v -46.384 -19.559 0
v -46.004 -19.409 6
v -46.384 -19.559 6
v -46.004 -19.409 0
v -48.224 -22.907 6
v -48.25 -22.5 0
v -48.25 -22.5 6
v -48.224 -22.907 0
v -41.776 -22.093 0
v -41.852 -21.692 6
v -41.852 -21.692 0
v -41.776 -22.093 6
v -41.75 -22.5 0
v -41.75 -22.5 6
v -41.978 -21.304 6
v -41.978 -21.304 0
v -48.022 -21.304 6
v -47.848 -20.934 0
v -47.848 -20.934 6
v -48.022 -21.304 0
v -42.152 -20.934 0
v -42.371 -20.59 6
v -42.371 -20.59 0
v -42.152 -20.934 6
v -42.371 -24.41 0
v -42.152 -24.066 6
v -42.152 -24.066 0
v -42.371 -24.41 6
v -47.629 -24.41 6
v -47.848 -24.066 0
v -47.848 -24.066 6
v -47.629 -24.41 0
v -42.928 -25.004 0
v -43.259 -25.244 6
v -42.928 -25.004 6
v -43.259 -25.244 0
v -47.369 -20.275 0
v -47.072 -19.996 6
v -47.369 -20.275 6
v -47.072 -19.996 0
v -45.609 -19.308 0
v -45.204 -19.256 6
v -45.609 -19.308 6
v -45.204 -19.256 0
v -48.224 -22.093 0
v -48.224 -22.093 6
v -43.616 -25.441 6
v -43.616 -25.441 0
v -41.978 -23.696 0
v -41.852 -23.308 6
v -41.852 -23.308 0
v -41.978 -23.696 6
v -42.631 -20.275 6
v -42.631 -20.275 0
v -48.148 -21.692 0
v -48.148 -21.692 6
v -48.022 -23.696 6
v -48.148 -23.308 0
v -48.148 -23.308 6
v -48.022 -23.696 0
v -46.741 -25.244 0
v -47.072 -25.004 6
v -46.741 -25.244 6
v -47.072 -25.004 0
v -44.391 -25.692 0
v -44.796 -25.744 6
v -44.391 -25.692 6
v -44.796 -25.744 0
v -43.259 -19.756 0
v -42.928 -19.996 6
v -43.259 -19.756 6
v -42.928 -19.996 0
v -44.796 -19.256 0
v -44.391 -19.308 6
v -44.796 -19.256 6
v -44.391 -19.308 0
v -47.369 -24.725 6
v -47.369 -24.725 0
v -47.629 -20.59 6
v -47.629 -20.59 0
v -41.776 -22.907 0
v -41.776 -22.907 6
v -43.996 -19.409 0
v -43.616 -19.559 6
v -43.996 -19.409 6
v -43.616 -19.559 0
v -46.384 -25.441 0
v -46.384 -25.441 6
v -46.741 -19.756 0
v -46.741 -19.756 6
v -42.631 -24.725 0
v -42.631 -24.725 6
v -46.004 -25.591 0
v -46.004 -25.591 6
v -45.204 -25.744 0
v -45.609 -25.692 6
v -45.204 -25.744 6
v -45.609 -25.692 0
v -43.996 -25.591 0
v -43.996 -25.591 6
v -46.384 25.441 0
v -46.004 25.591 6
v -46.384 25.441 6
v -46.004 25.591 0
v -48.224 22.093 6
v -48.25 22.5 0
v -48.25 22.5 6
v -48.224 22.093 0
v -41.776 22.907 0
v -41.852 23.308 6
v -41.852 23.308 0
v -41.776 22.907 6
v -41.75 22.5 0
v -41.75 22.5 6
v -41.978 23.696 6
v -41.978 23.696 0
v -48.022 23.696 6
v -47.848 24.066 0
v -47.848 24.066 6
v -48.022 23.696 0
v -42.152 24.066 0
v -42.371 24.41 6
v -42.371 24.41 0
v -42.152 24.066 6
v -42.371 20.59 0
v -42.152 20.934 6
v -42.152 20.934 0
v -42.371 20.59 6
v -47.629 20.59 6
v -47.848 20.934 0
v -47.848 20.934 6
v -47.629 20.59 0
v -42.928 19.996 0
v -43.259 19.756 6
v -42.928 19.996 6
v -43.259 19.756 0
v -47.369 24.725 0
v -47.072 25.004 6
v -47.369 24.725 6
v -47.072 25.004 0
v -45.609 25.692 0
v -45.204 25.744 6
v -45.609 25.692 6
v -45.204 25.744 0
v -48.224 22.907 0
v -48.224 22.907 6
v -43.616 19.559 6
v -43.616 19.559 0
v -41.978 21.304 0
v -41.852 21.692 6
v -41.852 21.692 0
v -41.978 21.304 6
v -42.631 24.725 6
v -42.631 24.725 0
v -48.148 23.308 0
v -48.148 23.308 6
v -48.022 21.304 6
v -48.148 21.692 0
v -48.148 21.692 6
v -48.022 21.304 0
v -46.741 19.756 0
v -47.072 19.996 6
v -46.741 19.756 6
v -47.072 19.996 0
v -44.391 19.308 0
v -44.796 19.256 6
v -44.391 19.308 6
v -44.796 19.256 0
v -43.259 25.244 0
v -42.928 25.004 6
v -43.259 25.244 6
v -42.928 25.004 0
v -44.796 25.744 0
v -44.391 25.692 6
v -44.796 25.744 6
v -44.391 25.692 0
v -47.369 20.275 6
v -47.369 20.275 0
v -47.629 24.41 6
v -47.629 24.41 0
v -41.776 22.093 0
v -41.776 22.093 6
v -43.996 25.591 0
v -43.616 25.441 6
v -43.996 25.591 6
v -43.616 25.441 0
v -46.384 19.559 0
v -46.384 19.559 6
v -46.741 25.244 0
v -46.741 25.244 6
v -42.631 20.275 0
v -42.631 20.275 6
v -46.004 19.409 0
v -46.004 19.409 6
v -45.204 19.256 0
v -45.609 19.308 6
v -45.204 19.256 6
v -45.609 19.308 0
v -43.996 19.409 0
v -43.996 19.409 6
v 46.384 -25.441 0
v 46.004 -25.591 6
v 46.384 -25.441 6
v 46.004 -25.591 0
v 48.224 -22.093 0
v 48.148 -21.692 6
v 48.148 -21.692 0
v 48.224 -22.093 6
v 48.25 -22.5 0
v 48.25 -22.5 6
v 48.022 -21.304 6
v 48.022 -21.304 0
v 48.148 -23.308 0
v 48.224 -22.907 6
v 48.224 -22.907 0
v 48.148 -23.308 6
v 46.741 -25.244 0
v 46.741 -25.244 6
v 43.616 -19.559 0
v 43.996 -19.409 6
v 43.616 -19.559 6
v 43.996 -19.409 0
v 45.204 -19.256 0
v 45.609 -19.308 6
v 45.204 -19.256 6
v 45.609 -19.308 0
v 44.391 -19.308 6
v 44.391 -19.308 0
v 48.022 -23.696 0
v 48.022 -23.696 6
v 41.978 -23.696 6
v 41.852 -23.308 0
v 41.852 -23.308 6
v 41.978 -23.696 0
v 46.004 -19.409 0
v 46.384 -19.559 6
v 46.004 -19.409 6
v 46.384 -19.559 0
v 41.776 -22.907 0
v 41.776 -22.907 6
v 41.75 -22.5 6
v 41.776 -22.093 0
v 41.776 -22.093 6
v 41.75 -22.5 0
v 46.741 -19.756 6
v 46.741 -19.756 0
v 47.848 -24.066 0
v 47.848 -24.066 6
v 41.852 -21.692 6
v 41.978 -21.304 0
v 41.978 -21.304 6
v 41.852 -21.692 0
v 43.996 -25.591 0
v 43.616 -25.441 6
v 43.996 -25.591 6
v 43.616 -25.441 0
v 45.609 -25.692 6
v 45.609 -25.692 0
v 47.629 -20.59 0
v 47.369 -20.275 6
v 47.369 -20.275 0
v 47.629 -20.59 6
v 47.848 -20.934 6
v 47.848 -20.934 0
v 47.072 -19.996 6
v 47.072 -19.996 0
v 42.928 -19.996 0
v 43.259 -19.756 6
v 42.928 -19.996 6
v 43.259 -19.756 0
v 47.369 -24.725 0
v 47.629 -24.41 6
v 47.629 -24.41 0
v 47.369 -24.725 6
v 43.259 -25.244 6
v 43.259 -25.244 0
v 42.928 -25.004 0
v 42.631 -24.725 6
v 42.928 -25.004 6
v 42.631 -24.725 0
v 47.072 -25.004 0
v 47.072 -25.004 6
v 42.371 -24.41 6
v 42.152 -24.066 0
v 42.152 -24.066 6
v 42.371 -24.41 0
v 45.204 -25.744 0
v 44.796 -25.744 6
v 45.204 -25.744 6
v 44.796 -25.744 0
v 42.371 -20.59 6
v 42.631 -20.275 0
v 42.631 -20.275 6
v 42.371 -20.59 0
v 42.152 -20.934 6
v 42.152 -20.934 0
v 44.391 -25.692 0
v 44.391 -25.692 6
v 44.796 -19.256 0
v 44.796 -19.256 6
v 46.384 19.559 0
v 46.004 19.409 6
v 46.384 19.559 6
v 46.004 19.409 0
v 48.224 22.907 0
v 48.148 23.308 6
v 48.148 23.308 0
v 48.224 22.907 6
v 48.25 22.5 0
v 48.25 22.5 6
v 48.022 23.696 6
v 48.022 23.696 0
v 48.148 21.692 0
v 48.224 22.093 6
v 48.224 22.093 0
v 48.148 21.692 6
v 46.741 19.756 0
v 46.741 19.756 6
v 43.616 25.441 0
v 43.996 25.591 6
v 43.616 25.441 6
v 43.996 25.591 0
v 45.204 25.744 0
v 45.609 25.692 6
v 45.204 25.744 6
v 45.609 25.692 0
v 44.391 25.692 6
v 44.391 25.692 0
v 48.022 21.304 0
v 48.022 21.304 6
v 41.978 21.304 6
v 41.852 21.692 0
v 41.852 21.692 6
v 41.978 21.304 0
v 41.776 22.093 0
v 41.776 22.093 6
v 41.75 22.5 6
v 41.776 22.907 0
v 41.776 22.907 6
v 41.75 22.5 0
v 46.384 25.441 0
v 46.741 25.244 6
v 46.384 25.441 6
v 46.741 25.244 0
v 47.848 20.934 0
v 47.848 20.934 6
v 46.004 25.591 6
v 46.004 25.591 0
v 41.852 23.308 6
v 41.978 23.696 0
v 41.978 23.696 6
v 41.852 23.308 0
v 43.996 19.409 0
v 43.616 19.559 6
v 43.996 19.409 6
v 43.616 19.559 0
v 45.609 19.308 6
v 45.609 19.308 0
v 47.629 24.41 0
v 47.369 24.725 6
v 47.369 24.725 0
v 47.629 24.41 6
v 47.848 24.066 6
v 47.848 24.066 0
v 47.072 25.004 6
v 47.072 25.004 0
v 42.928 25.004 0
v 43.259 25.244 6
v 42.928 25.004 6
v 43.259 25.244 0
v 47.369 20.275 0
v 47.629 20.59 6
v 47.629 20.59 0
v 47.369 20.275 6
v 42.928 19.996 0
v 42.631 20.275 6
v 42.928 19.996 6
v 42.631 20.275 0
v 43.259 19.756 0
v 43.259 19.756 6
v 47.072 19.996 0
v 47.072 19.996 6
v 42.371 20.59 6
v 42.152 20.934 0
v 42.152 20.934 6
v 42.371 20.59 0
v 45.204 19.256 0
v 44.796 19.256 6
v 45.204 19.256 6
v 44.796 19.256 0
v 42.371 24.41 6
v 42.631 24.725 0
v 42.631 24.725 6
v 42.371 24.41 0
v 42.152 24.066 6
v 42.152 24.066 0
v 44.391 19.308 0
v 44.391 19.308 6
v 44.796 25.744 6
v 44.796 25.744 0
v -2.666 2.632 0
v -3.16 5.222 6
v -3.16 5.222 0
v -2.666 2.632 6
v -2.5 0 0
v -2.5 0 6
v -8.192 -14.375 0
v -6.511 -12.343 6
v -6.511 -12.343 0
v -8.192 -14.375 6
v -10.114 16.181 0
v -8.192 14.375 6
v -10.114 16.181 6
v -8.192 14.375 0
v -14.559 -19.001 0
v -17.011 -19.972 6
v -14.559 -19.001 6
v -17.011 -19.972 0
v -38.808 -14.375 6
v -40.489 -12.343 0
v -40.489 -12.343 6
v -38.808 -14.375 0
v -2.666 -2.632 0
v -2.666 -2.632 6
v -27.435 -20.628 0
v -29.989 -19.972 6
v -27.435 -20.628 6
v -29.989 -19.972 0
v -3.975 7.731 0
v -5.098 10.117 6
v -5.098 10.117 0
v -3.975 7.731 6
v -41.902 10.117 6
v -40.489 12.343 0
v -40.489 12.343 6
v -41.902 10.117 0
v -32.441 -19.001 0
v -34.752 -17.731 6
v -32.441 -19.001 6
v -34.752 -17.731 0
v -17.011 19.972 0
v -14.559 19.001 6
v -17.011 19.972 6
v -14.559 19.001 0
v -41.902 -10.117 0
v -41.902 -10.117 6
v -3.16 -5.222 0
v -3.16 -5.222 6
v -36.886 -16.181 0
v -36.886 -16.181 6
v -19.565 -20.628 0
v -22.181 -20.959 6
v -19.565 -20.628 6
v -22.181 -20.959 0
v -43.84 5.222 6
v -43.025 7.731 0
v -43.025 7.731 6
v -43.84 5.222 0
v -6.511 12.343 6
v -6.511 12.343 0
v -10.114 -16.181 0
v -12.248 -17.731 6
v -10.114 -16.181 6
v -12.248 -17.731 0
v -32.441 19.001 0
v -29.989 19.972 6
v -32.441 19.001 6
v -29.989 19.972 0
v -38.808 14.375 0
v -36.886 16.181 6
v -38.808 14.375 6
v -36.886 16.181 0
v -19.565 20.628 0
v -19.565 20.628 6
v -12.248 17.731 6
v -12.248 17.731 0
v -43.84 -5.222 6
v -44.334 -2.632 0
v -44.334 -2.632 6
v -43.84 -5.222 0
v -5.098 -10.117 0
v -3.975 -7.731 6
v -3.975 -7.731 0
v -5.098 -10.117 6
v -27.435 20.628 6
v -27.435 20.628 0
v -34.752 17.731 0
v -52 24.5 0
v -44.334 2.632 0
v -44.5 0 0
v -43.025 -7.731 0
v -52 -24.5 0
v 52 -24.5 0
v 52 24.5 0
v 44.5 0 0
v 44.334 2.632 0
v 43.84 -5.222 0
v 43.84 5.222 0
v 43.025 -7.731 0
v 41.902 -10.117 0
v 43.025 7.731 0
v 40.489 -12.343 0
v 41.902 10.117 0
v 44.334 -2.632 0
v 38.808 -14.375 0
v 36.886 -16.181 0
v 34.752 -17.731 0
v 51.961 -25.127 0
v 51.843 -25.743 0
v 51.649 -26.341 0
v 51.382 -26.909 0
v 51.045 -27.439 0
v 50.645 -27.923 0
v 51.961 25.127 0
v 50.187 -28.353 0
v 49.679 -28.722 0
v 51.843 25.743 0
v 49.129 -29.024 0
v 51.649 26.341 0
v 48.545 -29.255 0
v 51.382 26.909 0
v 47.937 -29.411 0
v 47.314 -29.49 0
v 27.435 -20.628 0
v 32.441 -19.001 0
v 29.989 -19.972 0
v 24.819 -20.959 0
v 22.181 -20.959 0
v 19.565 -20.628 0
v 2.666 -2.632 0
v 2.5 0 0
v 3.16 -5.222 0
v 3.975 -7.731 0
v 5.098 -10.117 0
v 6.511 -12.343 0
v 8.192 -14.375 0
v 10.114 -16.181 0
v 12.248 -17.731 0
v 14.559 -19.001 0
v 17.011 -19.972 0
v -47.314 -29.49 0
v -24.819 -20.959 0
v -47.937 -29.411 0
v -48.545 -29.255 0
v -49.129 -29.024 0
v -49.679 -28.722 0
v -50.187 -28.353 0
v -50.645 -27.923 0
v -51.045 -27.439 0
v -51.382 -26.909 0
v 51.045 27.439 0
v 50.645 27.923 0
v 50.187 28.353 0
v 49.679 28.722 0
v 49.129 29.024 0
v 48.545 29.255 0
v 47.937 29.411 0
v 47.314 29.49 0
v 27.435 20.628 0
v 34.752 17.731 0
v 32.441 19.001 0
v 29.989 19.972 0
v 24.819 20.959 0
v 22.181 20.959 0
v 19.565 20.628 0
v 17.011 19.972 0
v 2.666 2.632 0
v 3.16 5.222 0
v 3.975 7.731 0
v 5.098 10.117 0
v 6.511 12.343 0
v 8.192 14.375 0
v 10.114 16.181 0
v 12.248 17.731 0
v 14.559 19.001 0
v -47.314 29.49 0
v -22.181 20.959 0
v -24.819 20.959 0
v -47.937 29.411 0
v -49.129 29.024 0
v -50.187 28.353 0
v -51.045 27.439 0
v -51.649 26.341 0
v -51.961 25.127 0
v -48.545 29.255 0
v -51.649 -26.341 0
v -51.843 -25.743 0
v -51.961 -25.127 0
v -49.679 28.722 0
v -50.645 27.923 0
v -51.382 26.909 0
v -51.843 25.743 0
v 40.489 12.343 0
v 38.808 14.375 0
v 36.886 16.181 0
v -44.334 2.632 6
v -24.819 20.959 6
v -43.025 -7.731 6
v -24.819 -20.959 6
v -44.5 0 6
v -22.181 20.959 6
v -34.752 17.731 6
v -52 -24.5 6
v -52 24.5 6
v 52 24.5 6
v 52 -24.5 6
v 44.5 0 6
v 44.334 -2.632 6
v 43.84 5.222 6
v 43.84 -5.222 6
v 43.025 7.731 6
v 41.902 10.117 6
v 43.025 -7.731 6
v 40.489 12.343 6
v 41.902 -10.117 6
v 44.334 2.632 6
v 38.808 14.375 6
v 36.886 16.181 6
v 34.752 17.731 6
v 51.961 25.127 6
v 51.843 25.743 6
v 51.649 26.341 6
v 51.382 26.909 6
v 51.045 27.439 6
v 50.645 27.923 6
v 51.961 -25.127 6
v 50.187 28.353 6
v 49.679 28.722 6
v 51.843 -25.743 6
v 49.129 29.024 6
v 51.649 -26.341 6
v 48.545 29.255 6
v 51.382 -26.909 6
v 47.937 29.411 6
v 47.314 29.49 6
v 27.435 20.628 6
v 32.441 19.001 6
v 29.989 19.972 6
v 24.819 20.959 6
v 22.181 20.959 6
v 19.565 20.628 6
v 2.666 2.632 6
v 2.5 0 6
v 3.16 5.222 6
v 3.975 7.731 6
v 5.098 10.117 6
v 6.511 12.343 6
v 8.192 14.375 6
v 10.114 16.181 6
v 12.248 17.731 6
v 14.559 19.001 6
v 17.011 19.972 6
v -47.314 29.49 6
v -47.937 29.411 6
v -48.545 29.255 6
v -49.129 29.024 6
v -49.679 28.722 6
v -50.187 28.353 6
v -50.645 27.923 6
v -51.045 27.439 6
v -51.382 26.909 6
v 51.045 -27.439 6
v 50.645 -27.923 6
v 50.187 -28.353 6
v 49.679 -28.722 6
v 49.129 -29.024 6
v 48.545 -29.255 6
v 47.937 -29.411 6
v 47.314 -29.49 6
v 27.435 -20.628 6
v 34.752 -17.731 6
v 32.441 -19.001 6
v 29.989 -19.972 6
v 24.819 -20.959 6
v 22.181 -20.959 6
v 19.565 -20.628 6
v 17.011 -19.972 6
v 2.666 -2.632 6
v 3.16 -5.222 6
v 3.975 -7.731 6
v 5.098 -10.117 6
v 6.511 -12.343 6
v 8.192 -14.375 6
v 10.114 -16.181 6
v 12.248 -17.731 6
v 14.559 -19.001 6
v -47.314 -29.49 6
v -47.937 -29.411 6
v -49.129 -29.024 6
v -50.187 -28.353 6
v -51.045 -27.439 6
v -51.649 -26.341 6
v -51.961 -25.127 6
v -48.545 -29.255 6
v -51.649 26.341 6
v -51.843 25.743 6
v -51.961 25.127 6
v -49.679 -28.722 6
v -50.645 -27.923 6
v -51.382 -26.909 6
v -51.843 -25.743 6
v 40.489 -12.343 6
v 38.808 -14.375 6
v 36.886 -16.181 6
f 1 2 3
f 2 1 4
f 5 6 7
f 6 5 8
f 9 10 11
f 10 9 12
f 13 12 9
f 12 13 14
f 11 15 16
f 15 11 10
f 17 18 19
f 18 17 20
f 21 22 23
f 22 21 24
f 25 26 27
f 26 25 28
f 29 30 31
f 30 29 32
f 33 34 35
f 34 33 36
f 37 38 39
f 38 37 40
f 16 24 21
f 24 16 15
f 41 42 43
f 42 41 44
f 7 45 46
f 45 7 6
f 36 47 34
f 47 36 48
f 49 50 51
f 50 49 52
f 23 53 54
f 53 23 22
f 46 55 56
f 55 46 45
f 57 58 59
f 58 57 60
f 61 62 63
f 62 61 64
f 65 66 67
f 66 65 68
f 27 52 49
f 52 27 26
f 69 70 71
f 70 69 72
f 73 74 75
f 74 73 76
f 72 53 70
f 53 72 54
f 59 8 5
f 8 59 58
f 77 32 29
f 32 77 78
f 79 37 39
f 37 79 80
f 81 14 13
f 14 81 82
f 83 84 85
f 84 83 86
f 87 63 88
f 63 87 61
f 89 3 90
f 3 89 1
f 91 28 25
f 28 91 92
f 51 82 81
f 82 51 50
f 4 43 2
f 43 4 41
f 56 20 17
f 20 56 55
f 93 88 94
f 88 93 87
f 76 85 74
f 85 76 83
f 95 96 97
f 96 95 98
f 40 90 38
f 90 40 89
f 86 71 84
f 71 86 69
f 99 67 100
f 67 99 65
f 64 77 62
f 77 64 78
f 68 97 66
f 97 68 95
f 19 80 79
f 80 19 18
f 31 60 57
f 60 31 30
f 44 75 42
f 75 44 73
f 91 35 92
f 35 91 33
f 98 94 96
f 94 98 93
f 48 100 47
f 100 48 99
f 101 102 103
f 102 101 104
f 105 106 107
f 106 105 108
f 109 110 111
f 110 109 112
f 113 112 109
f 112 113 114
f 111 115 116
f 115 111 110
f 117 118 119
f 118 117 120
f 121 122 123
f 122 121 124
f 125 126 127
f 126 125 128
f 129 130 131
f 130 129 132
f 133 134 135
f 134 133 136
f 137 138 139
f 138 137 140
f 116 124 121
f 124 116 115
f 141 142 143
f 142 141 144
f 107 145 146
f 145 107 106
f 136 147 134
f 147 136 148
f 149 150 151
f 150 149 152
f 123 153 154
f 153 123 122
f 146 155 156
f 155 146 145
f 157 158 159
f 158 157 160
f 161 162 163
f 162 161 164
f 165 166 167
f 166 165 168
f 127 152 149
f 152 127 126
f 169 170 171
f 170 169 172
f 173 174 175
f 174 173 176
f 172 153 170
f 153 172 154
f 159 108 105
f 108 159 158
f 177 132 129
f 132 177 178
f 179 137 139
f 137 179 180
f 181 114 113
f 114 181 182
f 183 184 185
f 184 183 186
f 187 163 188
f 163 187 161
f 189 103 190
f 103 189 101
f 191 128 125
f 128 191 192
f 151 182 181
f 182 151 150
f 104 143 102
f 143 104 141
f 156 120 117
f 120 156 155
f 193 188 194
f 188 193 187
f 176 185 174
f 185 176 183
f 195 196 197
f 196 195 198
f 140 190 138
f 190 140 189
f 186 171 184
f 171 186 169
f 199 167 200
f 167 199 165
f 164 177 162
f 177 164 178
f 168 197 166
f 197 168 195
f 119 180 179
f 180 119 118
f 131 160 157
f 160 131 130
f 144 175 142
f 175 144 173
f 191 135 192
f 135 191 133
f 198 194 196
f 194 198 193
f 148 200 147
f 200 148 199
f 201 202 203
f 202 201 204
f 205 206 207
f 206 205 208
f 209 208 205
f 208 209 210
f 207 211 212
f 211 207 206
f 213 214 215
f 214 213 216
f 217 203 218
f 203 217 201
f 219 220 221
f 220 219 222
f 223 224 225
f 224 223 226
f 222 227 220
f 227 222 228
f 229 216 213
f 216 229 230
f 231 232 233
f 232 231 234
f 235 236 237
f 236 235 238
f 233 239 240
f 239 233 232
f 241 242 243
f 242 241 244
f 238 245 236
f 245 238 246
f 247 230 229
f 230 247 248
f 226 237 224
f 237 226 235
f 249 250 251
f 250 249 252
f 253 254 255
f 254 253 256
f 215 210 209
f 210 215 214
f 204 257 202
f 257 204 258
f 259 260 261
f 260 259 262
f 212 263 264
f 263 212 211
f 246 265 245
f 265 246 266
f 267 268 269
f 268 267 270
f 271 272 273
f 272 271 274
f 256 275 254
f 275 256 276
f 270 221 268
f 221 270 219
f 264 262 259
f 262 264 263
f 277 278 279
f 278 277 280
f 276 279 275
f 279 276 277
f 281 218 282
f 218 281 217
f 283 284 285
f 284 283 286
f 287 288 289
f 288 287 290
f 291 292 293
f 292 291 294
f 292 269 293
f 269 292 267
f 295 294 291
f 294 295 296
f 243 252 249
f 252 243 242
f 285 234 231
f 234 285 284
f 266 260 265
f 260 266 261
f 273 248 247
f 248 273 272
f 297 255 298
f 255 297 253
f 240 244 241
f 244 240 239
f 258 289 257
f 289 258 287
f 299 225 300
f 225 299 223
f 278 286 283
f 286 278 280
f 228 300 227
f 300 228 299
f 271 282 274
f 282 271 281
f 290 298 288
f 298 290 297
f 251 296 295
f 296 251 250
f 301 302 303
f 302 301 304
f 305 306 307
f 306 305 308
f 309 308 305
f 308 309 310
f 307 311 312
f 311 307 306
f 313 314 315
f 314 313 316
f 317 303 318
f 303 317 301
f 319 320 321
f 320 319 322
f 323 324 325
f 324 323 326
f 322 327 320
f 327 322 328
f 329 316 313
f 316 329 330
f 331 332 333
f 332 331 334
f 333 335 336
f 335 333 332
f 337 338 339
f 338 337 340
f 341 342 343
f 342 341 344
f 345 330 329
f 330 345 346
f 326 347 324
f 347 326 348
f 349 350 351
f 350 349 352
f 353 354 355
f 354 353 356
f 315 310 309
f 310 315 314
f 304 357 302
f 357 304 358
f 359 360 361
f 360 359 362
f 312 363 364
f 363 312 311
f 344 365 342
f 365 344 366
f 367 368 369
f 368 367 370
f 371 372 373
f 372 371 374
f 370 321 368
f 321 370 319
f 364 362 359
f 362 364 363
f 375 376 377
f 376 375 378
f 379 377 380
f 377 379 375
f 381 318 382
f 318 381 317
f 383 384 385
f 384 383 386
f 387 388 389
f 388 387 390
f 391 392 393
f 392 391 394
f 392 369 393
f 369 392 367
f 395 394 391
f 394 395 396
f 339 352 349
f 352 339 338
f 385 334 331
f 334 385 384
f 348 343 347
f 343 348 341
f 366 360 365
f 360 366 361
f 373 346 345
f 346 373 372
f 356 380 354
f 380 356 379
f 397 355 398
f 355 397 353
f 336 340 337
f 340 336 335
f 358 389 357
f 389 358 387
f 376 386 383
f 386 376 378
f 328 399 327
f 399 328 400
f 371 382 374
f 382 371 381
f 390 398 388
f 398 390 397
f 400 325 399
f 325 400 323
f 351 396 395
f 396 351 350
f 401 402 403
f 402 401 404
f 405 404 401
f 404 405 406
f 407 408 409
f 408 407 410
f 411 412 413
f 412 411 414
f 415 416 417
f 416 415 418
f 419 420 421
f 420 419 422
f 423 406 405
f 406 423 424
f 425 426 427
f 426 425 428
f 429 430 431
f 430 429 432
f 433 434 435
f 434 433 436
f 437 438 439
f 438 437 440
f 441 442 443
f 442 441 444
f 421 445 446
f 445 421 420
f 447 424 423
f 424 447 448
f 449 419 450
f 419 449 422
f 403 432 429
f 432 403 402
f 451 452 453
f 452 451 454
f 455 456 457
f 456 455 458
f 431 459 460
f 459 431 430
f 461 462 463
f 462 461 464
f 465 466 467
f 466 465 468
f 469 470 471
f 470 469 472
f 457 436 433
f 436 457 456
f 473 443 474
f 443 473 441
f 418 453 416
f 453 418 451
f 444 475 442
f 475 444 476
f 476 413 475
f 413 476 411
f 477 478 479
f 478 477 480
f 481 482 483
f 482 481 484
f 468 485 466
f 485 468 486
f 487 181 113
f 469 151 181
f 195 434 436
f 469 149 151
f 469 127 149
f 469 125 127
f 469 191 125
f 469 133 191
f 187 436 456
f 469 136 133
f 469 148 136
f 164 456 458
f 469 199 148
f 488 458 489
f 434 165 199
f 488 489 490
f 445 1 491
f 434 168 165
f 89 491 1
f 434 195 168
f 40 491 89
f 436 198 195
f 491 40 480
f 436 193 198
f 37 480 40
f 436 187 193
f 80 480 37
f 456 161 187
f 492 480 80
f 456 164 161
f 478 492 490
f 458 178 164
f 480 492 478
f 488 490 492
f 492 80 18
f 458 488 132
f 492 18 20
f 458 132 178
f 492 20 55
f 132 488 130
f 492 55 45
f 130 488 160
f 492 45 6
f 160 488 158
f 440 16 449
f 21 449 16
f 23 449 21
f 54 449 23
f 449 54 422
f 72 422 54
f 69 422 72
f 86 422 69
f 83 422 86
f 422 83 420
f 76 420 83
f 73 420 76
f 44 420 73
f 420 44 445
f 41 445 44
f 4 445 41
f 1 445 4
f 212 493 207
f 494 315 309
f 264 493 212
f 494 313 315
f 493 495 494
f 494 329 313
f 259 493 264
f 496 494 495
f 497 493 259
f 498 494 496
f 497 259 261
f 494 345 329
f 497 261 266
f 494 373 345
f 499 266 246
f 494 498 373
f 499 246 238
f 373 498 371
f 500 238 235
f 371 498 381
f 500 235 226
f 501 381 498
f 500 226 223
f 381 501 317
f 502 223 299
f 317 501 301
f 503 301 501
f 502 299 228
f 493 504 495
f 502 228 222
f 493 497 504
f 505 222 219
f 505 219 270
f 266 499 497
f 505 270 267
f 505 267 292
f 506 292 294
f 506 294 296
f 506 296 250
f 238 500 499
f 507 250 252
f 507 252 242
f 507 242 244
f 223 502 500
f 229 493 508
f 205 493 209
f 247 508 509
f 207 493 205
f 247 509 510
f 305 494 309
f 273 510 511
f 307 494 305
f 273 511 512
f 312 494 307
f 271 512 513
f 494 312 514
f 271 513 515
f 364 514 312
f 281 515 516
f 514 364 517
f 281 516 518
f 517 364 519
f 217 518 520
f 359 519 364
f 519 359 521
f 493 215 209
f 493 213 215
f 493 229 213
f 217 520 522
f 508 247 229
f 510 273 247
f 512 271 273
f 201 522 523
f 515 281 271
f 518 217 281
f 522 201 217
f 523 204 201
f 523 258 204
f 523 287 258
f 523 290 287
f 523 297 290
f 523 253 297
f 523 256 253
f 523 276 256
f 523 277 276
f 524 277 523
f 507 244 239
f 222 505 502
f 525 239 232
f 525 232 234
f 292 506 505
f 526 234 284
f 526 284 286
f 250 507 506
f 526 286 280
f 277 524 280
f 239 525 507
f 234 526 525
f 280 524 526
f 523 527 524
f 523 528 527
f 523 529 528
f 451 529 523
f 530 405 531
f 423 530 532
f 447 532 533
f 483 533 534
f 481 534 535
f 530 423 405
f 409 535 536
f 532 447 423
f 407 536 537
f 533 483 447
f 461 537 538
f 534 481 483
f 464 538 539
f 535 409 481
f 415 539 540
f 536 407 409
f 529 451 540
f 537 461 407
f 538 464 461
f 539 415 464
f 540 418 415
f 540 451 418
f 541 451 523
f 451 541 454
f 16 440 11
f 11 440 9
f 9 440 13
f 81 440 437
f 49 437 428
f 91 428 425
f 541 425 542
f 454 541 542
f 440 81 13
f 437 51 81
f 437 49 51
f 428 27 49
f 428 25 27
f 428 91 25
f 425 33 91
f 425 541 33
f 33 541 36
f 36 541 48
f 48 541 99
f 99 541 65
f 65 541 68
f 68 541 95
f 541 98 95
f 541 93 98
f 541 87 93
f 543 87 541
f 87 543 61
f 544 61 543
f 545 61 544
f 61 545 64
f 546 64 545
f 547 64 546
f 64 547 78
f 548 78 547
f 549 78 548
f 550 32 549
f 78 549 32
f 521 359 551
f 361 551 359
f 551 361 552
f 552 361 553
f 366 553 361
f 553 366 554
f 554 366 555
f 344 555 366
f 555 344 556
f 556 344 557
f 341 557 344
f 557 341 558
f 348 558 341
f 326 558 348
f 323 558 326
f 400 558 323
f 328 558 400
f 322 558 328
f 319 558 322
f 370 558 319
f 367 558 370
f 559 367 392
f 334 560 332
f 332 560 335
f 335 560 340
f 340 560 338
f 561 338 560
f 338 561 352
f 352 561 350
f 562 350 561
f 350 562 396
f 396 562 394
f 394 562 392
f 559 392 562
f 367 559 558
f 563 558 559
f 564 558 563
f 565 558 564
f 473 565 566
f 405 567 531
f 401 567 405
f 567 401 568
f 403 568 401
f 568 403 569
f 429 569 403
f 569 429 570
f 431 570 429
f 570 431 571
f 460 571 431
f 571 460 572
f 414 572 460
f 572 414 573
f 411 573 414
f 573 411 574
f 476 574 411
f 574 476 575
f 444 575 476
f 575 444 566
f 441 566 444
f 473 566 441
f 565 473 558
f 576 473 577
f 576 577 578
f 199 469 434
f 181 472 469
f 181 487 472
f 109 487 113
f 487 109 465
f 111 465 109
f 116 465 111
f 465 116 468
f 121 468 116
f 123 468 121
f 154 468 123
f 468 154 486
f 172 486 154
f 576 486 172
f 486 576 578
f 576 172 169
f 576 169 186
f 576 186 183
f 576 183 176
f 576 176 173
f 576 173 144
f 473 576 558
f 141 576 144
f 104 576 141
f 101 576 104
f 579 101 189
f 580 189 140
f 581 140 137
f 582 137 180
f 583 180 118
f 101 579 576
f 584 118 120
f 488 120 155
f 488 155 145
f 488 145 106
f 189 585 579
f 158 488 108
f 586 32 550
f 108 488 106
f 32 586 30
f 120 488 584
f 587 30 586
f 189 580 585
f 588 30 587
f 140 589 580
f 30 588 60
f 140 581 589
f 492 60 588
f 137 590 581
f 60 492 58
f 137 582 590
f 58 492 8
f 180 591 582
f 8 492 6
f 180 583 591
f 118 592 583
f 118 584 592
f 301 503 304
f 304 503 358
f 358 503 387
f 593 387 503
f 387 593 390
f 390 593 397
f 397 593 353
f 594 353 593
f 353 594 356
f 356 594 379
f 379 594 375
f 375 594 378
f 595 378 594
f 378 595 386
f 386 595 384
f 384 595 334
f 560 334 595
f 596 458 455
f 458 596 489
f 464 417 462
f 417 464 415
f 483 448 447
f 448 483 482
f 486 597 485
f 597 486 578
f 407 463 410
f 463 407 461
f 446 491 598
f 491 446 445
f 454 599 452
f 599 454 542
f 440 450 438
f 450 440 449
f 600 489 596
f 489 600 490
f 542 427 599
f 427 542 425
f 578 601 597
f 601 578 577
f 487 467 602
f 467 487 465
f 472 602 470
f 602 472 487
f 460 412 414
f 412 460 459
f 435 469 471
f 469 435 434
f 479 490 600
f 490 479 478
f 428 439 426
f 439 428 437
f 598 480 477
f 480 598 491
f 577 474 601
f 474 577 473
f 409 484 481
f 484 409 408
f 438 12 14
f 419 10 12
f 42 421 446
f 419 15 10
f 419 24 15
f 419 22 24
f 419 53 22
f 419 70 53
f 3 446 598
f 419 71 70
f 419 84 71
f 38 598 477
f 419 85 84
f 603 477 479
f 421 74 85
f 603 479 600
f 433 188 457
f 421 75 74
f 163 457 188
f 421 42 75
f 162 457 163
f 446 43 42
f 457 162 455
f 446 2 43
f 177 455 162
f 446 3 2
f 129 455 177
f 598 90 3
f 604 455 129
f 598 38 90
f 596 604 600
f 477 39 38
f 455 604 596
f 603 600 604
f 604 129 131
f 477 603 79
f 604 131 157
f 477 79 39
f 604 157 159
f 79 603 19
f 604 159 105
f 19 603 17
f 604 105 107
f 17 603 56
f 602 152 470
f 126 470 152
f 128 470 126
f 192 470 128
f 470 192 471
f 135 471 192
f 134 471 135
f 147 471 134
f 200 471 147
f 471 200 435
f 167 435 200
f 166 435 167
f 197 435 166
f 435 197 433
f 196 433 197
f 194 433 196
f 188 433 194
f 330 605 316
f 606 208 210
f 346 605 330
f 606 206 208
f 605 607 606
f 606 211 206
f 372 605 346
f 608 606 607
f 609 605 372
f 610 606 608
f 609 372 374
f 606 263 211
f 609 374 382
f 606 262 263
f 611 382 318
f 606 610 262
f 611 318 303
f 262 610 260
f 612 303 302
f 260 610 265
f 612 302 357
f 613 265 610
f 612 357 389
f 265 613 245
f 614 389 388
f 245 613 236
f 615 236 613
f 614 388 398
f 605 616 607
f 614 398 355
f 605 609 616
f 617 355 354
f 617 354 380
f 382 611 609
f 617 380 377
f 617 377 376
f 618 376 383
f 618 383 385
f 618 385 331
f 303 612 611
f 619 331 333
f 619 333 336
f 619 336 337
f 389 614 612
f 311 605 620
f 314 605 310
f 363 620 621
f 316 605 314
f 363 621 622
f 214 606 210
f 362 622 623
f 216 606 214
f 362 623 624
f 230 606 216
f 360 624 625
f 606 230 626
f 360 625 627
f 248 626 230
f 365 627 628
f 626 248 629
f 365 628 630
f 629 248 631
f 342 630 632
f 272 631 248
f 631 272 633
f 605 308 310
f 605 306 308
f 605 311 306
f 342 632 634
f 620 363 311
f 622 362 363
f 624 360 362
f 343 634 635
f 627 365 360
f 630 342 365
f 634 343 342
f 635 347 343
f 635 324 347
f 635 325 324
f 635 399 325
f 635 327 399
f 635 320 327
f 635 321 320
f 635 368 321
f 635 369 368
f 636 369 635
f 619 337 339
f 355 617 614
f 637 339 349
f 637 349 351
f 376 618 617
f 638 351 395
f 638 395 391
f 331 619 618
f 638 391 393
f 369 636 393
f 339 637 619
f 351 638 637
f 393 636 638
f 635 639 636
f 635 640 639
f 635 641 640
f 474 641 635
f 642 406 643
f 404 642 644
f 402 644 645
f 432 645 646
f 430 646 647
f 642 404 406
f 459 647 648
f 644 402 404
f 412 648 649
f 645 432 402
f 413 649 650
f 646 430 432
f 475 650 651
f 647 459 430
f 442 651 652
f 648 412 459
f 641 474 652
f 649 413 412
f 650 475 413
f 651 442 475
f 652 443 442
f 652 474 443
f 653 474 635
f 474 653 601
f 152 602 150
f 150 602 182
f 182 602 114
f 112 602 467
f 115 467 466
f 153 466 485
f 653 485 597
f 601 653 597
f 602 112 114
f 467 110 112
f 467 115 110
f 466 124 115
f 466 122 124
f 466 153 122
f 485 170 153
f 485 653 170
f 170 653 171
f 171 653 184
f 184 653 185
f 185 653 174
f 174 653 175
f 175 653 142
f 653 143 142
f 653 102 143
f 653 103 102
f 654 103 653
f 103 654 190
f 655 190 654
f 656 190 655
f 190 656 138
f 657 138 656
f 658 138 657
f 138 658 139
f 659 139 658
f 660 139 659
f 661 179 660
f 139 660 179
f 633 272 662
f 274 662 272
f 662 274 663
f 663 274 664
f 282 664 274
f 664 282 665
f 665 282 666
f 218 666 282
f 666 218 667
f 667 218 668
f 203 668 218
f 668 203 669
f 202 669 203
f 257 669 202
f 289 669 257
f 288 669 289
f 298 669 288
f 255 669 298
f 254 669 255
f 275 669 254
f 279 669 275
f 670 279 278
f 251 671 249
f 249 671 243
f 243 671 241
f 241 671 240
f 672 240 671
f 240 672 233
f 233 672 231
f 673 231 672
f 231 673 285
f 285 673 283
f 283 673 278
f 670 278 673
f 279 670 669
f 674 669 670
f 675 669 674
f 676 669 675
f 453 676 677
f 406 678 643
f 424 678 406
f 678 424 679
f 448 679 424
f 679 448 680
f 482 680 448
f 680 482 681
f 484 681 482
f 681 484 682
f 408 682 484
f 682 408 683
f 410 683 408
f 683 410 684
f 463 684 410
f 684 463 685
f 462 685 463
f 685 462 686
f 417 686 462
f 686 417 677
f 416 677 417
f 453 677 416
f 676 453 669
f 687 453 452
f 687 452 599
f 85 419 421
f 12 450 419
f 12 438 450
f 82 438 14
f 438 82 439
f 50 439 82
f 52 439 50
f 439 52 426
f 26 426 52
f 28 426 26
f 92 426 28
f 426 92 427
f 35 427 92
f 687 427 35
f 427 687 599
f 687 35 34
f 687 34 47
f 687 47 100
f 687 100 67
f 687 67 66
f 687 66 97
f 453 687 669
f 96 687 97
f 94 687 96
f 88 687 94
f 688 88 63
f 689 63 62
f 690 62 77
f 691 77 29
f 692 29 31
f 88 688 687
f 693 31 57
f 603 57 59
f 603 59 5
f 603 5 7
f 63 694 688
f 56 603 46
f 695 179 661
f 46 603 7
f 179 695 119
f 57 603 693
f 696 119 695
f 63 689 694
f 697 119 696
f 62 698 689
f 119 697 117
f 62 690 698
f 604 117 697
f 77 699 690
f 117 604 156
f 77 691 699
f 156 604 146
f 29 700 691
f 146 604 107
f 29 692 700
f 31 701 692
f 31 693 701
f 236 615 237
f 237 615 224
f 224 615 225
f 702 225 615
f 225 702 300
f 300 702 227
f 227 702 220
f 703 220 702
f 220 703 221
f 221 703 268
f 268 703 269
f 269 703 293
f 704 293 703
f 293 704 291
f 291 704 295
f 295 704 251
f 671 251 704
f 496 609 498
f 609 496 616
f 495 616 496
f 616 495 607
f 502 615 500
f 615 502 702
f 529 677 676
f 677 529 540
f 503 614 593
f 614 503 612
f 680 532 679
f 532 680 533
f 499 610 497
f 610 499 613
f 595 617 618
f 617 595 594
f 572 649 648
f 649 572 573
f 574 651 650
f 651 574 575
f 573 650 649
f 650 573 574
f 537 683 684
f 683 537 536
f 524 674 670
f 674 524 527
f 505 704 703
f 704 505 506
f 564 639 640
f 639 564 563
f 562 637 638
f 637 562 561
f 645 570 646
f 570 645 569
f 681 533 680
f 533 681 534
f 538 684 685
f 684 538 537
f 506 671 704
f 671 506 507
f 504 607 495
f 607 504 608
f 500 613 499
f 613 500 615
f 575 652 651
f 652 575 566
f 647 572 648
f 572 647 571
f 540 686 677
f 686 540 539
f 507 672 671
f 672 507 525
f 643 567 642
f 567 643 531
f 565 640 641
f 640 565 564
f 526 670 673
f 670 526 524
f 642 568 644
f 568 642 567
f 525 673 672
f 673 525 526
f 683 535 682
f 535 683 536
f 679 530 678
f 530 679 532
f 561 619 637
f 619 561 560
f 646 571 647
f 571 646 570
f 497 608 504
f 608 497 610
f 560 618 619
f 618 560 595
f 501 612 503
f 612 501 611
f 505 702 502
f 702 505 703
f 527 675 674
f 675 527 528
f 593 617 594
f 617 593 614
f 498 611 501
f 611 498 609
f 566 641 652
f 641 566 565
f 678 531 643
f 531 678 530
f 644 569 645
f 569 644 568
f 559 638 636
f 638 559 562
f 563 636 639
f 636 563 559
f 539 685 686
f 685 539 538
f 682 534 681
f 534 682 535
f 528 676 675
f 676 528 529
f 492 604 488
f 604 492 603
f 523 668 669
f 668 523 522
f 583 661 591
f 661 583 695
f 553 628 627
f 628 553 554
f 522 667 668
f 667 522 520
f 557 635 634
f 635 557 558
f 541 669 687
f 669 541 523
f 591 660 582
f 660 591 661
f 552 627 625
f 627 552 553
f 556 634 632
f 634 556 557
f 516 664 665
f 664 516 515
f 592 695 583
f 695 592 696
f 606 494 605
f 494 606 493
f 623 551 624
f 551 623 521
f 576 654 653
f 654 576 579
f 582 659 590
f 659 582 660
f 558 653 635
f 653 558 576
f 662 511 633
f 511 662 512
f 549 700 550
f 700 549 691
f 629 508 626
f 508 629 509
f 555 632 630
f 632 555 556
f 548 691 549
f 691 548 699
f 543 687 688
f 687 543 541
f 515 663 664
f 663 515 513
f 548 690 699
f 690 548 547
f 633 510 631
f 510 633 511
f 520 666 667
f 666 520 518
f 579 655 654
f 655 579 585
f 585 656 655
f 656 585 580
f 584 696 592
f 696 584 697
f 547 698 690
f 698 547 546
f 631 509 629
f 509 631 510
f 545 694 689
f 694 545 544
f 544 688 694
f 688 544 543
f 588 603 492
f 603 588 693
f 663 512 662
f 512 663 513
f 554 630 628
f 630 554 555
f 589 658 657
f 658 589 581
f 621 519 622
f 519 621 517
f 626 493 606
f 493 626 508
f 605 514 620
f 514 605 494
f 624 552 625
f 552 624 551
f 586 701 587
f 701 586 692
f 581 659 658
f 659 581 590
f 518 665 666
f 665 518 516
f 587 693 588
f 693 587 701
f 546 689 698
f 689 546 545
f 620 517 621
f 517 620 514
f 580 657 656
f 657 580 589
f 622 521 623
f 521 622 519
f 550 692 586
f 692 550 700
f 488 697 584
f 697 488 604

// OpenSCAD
$fn = 50;

difference() {
	union() {
		hull() {
			translate(v = [-47.0, 24.5, 0]) {
				cylinder(h = 6, r = 5);
			}
			translate(v = [47.0, 24.5, 0]) {
				cylinder(h = 6, r = 5);
			}
			translate(v = [-47.0, -24.5, 0]) {
				cylinder(h = 6, r = 5);
			}
			translate(v = [47.0, -24.5, 0]) {
				cylinder(h = 6, r = 5);
			}
		}
	}
	union() {
		translate(v = [-45.0, -22.5, -100.0]) {
			cylinder(h = 200, r = 3.25);
		}
		translate(v = [-45.0, 22.5, -100.0]) {
			cylinder(h = 200, r = 3.25);
		}
		translate(v = [45.0, -22.5, -100.0]) {
			cylinder(h = 200, r = 3.25);
		}
		translate(v = [45.0, 22.5, -100.0]) {
			cylinder(h = 200, r = 3.25);
		}
		translate(v = [-45.0, -22.5, -100.0]) {
			cylinder(h = 200, r = 1.8);
		}
		translate(v = [-45.0, 22.5, -100.0]) {
			cylinder(h = 200, r = 1.8);
		}
		translate(v = [45.0, -22.5, -100.0]) {
			cylinder(h = 200, r = 1.8);
		}
		translate(v = [45.0, 22.5, -100.0]) {
			cylinder(h = 200, r = 1.8);
		}
		translate(v = [-23.5, 0, 0.0]) {
			cylinder(h = 6, r = 21.0);
		}
		translate(v = [23.5, 0, 0.0]) {
			cylinder(h = 6, r = 21.0);
		}
	}
}
